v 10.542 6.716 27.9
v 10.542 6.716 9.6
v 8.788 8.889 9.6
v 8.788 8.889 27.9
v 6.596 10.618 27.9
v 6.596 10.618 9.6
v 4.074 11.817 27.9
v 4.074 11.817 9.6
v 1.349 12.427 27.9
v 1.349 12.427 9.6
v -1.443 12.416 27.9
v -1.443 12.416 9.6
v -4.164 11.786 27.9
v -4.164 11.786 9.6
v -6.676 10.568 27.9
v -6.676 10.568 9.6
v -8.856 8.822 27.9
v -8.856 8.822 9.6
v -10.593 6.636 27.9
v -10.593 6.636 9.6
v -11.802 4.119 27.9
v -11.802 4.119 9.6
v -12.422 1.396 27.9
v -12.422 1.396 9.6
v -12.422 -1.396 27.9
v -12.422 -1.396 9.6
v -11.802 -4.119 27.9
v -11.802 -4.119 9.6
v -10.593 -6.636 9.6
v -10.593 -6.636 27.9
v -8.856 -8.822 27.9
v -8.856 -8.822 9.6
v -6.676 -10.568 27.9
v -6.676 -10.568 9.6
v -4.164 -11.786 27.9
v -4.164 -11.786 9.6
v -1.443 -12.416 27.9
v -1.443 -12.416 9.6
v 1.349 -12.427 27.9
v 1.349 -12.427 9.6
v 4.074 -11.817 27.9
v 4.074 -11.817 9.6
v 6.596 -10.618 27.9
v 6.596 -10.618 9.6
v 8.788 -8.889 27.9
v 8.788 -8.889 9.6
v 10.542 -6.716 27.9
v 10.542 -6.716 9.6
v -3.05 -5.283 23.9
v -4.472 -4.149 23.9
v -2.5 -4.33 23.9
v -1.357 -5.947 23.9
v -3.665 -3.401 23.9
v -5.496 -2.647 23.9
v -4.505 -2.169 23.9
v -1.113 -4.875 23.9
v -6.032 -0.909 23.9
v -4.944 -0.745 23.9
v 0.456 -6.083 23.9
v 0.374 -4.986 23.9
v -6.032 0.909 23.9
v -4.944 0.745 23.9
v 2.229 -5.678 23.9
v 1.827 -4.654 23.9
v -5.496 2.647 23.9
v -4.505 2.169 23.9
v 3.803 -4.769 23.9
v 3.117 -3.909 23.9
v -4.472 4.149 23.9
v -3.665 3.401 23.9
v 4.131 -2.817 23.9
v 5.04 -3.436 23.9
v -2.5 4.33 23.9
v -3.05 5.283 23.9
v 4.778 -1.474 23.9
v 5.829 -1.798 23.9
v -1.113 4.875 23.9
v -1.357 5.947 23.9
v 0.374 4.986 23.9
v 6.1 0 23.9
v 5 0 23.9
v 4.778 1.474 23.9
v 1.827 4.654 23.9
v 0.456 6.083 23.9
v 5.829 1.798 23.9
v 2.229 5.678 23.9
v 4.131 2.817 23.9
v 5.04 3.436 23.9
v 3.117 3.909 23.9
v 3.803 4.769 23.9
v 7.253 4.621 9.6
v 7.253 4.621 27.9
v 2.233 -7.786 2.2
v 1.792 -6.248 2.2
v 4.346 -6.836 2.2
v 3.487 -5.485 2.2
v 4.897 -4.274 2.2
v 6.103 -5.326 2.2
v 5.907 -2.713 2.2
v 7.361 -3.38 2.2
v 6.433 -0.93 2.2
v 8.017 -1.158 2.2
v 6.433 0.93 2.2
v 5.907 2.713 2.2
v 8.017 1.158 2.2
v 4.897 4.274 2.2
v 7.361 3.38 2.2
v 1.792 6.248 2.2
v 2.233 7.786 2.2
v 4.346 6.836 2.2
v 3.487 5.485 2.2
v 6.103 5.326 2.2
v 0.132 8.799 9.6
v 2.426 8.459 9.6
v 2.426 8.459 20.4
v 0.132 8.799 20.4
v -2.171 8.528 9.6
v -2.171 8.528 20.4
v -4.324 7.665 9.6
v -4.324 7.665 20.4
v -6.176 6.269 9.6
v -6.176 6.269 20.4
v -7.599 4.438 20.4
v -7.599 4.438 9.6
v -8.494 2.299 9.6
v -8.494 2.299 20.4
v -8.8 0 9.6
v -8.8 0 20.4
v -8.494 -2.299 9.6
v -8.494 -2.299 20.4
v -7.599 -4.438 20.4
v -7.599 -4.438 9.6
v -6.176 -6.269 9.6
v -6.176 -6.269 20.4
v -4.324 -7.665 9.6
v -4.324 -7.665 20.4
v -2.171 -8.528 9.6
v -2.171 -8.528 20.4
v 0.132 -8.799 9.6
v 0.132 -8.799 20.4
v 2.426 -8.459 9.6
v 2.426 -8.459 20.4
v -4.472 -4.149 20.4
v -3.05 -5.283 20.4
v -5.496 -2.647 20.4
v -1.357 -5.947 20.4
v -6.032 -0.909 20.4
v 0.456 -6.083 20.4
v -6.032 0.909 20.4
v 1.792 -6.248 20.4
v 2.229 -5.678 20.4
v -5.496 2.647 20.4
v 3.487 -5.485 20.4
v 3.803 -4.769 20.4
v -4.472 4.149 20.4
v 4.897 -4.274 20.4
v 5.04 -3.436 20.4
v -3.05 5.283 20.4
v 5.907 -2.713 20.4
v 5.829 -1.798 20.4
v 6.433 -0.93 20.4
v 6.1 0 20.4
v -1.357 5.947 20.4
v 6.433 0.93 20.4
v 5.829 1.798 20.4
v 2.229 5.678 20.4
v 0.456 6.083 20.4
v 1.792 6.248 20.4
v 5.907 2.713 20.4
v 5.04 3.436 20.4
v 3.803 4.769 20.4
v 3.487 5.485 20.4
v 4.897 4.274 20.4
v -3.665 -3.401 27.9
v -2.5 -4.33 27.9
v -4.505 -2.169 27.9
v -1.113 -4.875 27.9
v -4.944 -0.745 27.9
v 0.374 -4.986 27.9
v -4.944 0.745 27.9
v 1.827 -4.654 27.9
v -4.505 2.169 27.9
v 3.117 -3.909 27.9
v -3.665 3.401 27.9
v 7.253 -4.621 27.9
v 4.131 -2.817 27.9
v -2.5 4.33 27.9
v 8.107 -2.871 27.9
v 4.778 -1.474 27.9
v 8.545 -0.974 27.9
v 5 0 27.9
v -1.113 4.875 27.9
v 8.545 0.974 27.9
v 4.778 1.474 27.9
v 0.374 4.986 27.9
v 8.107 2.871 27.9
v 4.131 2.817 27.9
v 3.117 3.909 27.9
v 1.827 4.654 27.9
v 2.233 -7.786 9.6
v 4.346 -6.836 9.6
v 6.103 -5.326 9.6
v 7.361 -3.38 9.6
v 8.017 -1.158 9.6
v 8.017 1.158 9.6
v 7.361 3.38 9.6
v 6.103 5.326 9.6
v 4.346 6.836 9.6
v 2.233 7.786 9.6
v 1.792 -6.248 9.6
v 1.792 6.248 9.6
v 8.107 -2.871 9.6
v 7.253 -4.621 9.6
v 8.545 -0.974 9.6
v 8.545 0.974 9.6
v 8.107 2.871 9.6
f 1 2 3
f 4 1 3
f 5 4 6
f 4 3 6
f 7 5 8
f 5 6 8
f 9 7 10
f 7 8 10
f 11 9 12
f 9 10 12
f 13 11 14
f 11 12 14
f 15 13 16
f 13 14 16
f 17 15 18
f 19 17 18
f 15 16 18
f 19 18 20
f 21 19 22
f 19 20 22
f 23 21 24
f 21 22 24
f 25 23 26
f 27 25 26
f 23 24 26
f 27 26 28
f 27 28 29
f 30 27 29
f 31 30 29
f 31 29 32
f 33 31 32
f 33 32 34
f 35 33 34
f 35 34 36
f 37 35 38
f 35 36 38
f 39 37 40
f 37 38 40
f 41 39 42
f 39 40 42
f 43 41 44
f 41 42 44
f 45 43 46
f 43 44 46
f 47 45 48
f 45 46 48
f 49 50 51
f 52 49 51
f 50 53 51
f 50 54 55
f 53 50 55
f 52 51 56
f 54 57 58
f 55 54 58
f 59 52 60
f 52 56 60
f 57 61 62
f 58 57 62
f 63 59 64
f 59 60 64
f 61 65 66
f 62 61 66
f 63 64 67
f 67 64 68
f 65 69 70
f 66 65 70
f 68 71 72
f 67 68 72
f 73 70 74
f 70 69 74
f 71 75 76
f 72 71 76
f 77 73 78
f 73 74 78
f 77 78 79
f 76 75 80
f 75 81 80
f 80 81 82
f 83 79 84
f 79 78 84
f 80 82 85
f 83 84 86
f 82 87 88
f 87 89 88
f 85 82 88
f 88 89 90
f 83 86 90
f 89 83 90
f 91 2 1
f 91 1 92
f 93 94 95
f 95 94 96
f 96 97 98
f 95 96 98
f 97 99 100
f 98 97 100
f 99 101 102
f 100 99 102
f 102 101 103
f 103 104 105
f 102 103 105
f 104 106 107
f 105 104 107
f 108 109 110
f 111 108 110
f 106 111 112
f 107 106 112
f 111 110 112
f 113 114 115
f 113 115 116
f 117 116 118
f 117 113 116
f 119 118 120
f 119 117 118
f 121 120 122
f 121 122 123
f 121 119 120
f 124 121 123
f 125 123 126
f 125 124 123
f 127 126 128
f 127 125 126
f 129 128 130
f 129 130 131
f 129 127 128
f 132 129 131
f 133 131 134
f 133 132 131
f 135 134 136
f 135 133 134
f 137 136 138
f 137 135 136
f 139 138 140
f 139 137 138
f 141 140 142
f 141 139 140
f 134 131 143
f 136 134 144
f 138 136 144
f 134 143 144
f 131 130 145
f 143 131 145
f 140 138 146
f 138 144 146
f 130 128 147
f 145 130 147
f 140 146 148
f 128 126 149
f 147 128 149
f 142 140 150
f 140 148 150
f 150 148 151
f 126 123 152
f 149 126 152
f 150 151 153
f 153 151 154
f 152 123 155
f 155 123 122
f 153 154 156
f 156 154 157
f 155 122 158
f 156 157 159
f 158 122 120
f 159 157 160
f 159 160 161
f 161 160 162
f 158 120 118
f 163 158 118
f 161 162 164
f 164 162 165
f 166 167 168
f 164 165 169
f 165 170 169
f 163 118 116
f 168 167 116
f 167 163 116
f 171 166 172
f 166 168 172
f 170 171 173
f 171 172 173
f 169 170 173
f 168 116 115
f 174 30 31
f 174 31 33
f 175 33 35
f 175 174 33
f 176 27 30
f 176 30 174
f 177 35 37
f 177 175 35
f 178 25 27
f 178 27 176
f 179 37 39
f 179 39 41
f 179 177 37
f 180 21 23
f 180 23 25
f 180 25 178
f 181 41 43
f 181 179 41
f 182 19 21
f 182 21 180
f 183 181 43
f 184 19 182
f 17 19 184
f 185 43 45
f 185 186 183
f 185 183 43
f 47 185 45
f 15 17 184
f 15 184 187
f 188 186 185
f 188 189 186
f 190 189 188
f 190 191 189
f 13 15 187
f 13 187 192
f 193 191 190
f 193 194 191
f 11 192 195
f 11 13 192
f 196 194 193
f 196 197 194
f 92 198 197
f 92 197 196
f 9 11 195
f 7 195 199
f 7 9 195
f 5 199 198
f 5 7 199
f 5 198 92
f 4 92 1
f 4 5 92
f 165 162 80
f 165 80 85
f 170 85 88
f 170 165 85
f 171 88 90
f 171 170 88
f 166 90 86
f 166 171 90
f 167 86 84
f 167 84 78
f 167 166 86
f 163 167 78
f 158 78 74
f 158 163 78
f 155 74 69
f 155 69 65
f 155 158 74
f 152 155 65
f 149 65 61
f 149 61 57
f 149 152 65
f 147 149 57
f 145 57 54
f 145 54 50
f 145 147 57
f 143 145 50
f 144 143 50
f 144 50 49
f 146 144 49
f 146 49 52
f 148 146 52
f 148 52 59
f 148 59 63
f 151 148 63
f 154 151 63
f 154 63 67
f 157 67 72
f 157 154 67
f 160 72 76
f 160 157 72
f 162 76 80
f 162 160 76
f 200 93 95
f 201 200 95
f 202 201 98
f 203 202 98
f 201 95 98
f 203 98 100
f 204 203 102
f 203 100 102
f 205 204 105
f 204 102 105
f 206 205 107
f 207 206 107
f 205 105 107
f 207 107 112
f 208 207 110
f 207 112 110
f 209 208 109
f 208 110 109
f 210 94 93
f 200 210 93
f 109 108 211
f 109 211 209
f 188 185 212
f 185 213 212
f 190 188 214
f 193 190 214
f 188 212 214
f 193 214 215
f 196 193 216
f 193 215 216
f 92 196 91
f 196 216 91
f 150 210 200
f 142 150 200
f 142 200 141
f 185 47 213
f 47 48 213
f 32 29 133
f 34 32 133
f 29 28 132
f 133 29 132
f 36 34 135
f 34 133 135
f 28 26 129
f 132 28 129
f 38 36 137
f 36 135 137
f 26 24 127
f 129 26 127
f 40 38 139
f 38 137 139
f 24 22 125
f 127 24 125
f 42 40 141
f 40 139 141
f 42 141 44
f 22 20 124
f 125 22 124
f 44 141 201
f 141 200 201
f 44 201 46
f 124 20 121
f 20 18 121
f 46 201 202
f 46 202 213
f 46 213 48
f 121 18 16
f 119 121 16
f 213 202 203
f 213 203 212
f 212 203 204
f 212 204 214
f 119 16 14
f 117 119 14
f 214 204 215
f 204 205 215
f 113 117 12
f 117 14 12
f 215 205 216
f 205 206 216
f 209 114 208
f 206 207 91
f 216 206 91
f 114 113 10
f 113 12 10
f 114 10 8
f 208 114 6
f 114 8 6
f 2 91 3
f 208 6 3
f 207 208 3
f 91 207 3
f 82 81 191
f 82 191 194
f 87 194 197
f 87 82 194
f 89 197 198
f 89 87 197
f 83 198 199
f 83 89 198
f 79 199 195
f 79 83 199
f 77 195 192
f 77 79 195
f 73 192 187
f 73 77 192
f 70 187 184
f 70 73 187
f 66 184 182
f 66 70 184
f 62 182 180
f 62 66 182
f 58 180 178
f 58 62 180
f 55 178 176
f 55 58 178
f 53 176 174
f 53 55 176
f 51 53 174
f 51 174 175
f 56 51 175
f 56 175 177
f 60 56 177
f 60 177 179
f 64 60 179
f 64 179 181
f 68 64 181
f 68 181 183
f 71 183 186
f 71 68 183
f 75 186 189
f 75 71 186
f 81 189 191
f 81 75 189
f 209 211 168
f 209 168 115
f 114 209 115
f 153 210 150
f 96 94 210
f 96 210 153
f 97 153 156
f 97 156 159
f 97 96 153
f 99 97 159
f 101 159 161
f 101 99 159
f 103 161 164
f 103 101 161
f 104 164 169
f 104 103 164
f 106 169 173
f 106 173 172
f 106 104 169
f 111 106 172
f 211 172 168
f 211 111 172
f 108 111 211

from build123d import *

# Parameters (mm, degrees)
PAD021_DEPTH = 7.4
PAD022_DEPTH = 10.8
SKETCH051_R  = 6.1
PAD023_DEPTH = 3.5
SKETCH052_R  = 5
PAD024_DEPTH = 4


with BuildPart() as part:
    # Sketch049 → Pad021 (new body)
    with BuildSketch(Plane.XY):
        with BuildLine():
            ThreePointArc((2.2326625821, -7.7862197371), (8.1, 0), (2.2326625821, 7.7862197371))
            Line((1.7916428128, 6.2482010236), (2.2326625821, 7.7862197371))
            ThreePointArc((1.7916428128, -6.2482010236), (6.5, 0), (1.7916428128, 6.2482010236))
            Line((1.7916428128, -6.2482010236), (2.2326625821, -7.7862197371))
        make_face()
    extrude(amount=PAD021_DEPTH)

    # Sketch050 (on Face6 of Pad021) → Pad022 (join)
    with BuildSketch(Plane.XY.offset(7.4)):
        with BuildLine():
            ThreePointArc((10.5423930727, 6.7162451043), (-12.5, 0), (10.5423930727, -6.7162451043))
            Line((10.5423930727, -6.7162451043), (7.253166434, -4.6207766318))
            ThreePointArc((7.253166434, -4.6207766318), (8.6, 0), (7.253166434, 4.6207766318))
            Line((10.5423930727, 6.7162451043), (7.253166434, 4.6207766318))
        make_face()
        with BuildLine():
            ThreePointArc((2.4256087312, 8.4591029243), (-8.8, 0), (2.4256087312, -8.4591029243))
            Line((1.7916428128, -6.2482010236), (2.4256087312, -8.4591029243))
            ThreePointArc((1.7916428128, -6.2482010236), (6.5, 0), (1.7916428128, 6.2482010236))
            Line((1.7916428128, 6.2482010236), (2.4256087312, 8.4591029243))
        make_face(mode=Mode.SUBTRACT)
    extrude(amount=PAD022_DEPTH)

    # Sketch051 (on Face10 of Pad022) → Pad023 (join)
    with BuildSketch(Plane.XY.offset(18.2)):
        with BuildLine():
            ThreePointArc((10.5423930727, 6.7162451043), (-12.5, 0), (10.5423930727, -6.7162451043))
            Line((10.5423930727, -6.7162451043), (7.253166434, -4.6207766318))
            ThreePointArc((7.253166434, -4.6207766318), (8.6, 0), (7.253166434, 4.6207766318))
            Line((10.5423930727, 6.7162451043), (7.253166434, 4.6207766318))
        make_face()
        Circle(SKETCH051_R, mode=Mode.SUBTRACT)
    extrude(amount=PAD023_DEPTH)

    # Sketch052 (on Face21 of Pad023) → Pad024 (join)
    with BuildSketch(Plane.XY.offset(21.7)):
        with BuildLine():
            ThreePointArc((10.5423930727, 6.7162451043), (-12.5, 0), (10.5423930727, -6.7162451043))
            Line((10.5423930727, -6.7162451043), (7.253166434, -4.6207766318))
            ThreePointArc((7.253166434, -4.6207766318), (8.6, 0), (7.253166434, 4.6207766318))
            Line((10.5423930727, 6.7162451043), (7.253166434, 4.6207766318))
        make_face()
        Circle(SKETCH052_R, mode=Mode.SUBTRACT)
    extrude(amount=PAD024_DEPTH)


with BuildPart() as part_1:
    # Body006 placement: moved
    add(part.part.moved(Location((0, 0, 2.2))))


solid = part_1.part
